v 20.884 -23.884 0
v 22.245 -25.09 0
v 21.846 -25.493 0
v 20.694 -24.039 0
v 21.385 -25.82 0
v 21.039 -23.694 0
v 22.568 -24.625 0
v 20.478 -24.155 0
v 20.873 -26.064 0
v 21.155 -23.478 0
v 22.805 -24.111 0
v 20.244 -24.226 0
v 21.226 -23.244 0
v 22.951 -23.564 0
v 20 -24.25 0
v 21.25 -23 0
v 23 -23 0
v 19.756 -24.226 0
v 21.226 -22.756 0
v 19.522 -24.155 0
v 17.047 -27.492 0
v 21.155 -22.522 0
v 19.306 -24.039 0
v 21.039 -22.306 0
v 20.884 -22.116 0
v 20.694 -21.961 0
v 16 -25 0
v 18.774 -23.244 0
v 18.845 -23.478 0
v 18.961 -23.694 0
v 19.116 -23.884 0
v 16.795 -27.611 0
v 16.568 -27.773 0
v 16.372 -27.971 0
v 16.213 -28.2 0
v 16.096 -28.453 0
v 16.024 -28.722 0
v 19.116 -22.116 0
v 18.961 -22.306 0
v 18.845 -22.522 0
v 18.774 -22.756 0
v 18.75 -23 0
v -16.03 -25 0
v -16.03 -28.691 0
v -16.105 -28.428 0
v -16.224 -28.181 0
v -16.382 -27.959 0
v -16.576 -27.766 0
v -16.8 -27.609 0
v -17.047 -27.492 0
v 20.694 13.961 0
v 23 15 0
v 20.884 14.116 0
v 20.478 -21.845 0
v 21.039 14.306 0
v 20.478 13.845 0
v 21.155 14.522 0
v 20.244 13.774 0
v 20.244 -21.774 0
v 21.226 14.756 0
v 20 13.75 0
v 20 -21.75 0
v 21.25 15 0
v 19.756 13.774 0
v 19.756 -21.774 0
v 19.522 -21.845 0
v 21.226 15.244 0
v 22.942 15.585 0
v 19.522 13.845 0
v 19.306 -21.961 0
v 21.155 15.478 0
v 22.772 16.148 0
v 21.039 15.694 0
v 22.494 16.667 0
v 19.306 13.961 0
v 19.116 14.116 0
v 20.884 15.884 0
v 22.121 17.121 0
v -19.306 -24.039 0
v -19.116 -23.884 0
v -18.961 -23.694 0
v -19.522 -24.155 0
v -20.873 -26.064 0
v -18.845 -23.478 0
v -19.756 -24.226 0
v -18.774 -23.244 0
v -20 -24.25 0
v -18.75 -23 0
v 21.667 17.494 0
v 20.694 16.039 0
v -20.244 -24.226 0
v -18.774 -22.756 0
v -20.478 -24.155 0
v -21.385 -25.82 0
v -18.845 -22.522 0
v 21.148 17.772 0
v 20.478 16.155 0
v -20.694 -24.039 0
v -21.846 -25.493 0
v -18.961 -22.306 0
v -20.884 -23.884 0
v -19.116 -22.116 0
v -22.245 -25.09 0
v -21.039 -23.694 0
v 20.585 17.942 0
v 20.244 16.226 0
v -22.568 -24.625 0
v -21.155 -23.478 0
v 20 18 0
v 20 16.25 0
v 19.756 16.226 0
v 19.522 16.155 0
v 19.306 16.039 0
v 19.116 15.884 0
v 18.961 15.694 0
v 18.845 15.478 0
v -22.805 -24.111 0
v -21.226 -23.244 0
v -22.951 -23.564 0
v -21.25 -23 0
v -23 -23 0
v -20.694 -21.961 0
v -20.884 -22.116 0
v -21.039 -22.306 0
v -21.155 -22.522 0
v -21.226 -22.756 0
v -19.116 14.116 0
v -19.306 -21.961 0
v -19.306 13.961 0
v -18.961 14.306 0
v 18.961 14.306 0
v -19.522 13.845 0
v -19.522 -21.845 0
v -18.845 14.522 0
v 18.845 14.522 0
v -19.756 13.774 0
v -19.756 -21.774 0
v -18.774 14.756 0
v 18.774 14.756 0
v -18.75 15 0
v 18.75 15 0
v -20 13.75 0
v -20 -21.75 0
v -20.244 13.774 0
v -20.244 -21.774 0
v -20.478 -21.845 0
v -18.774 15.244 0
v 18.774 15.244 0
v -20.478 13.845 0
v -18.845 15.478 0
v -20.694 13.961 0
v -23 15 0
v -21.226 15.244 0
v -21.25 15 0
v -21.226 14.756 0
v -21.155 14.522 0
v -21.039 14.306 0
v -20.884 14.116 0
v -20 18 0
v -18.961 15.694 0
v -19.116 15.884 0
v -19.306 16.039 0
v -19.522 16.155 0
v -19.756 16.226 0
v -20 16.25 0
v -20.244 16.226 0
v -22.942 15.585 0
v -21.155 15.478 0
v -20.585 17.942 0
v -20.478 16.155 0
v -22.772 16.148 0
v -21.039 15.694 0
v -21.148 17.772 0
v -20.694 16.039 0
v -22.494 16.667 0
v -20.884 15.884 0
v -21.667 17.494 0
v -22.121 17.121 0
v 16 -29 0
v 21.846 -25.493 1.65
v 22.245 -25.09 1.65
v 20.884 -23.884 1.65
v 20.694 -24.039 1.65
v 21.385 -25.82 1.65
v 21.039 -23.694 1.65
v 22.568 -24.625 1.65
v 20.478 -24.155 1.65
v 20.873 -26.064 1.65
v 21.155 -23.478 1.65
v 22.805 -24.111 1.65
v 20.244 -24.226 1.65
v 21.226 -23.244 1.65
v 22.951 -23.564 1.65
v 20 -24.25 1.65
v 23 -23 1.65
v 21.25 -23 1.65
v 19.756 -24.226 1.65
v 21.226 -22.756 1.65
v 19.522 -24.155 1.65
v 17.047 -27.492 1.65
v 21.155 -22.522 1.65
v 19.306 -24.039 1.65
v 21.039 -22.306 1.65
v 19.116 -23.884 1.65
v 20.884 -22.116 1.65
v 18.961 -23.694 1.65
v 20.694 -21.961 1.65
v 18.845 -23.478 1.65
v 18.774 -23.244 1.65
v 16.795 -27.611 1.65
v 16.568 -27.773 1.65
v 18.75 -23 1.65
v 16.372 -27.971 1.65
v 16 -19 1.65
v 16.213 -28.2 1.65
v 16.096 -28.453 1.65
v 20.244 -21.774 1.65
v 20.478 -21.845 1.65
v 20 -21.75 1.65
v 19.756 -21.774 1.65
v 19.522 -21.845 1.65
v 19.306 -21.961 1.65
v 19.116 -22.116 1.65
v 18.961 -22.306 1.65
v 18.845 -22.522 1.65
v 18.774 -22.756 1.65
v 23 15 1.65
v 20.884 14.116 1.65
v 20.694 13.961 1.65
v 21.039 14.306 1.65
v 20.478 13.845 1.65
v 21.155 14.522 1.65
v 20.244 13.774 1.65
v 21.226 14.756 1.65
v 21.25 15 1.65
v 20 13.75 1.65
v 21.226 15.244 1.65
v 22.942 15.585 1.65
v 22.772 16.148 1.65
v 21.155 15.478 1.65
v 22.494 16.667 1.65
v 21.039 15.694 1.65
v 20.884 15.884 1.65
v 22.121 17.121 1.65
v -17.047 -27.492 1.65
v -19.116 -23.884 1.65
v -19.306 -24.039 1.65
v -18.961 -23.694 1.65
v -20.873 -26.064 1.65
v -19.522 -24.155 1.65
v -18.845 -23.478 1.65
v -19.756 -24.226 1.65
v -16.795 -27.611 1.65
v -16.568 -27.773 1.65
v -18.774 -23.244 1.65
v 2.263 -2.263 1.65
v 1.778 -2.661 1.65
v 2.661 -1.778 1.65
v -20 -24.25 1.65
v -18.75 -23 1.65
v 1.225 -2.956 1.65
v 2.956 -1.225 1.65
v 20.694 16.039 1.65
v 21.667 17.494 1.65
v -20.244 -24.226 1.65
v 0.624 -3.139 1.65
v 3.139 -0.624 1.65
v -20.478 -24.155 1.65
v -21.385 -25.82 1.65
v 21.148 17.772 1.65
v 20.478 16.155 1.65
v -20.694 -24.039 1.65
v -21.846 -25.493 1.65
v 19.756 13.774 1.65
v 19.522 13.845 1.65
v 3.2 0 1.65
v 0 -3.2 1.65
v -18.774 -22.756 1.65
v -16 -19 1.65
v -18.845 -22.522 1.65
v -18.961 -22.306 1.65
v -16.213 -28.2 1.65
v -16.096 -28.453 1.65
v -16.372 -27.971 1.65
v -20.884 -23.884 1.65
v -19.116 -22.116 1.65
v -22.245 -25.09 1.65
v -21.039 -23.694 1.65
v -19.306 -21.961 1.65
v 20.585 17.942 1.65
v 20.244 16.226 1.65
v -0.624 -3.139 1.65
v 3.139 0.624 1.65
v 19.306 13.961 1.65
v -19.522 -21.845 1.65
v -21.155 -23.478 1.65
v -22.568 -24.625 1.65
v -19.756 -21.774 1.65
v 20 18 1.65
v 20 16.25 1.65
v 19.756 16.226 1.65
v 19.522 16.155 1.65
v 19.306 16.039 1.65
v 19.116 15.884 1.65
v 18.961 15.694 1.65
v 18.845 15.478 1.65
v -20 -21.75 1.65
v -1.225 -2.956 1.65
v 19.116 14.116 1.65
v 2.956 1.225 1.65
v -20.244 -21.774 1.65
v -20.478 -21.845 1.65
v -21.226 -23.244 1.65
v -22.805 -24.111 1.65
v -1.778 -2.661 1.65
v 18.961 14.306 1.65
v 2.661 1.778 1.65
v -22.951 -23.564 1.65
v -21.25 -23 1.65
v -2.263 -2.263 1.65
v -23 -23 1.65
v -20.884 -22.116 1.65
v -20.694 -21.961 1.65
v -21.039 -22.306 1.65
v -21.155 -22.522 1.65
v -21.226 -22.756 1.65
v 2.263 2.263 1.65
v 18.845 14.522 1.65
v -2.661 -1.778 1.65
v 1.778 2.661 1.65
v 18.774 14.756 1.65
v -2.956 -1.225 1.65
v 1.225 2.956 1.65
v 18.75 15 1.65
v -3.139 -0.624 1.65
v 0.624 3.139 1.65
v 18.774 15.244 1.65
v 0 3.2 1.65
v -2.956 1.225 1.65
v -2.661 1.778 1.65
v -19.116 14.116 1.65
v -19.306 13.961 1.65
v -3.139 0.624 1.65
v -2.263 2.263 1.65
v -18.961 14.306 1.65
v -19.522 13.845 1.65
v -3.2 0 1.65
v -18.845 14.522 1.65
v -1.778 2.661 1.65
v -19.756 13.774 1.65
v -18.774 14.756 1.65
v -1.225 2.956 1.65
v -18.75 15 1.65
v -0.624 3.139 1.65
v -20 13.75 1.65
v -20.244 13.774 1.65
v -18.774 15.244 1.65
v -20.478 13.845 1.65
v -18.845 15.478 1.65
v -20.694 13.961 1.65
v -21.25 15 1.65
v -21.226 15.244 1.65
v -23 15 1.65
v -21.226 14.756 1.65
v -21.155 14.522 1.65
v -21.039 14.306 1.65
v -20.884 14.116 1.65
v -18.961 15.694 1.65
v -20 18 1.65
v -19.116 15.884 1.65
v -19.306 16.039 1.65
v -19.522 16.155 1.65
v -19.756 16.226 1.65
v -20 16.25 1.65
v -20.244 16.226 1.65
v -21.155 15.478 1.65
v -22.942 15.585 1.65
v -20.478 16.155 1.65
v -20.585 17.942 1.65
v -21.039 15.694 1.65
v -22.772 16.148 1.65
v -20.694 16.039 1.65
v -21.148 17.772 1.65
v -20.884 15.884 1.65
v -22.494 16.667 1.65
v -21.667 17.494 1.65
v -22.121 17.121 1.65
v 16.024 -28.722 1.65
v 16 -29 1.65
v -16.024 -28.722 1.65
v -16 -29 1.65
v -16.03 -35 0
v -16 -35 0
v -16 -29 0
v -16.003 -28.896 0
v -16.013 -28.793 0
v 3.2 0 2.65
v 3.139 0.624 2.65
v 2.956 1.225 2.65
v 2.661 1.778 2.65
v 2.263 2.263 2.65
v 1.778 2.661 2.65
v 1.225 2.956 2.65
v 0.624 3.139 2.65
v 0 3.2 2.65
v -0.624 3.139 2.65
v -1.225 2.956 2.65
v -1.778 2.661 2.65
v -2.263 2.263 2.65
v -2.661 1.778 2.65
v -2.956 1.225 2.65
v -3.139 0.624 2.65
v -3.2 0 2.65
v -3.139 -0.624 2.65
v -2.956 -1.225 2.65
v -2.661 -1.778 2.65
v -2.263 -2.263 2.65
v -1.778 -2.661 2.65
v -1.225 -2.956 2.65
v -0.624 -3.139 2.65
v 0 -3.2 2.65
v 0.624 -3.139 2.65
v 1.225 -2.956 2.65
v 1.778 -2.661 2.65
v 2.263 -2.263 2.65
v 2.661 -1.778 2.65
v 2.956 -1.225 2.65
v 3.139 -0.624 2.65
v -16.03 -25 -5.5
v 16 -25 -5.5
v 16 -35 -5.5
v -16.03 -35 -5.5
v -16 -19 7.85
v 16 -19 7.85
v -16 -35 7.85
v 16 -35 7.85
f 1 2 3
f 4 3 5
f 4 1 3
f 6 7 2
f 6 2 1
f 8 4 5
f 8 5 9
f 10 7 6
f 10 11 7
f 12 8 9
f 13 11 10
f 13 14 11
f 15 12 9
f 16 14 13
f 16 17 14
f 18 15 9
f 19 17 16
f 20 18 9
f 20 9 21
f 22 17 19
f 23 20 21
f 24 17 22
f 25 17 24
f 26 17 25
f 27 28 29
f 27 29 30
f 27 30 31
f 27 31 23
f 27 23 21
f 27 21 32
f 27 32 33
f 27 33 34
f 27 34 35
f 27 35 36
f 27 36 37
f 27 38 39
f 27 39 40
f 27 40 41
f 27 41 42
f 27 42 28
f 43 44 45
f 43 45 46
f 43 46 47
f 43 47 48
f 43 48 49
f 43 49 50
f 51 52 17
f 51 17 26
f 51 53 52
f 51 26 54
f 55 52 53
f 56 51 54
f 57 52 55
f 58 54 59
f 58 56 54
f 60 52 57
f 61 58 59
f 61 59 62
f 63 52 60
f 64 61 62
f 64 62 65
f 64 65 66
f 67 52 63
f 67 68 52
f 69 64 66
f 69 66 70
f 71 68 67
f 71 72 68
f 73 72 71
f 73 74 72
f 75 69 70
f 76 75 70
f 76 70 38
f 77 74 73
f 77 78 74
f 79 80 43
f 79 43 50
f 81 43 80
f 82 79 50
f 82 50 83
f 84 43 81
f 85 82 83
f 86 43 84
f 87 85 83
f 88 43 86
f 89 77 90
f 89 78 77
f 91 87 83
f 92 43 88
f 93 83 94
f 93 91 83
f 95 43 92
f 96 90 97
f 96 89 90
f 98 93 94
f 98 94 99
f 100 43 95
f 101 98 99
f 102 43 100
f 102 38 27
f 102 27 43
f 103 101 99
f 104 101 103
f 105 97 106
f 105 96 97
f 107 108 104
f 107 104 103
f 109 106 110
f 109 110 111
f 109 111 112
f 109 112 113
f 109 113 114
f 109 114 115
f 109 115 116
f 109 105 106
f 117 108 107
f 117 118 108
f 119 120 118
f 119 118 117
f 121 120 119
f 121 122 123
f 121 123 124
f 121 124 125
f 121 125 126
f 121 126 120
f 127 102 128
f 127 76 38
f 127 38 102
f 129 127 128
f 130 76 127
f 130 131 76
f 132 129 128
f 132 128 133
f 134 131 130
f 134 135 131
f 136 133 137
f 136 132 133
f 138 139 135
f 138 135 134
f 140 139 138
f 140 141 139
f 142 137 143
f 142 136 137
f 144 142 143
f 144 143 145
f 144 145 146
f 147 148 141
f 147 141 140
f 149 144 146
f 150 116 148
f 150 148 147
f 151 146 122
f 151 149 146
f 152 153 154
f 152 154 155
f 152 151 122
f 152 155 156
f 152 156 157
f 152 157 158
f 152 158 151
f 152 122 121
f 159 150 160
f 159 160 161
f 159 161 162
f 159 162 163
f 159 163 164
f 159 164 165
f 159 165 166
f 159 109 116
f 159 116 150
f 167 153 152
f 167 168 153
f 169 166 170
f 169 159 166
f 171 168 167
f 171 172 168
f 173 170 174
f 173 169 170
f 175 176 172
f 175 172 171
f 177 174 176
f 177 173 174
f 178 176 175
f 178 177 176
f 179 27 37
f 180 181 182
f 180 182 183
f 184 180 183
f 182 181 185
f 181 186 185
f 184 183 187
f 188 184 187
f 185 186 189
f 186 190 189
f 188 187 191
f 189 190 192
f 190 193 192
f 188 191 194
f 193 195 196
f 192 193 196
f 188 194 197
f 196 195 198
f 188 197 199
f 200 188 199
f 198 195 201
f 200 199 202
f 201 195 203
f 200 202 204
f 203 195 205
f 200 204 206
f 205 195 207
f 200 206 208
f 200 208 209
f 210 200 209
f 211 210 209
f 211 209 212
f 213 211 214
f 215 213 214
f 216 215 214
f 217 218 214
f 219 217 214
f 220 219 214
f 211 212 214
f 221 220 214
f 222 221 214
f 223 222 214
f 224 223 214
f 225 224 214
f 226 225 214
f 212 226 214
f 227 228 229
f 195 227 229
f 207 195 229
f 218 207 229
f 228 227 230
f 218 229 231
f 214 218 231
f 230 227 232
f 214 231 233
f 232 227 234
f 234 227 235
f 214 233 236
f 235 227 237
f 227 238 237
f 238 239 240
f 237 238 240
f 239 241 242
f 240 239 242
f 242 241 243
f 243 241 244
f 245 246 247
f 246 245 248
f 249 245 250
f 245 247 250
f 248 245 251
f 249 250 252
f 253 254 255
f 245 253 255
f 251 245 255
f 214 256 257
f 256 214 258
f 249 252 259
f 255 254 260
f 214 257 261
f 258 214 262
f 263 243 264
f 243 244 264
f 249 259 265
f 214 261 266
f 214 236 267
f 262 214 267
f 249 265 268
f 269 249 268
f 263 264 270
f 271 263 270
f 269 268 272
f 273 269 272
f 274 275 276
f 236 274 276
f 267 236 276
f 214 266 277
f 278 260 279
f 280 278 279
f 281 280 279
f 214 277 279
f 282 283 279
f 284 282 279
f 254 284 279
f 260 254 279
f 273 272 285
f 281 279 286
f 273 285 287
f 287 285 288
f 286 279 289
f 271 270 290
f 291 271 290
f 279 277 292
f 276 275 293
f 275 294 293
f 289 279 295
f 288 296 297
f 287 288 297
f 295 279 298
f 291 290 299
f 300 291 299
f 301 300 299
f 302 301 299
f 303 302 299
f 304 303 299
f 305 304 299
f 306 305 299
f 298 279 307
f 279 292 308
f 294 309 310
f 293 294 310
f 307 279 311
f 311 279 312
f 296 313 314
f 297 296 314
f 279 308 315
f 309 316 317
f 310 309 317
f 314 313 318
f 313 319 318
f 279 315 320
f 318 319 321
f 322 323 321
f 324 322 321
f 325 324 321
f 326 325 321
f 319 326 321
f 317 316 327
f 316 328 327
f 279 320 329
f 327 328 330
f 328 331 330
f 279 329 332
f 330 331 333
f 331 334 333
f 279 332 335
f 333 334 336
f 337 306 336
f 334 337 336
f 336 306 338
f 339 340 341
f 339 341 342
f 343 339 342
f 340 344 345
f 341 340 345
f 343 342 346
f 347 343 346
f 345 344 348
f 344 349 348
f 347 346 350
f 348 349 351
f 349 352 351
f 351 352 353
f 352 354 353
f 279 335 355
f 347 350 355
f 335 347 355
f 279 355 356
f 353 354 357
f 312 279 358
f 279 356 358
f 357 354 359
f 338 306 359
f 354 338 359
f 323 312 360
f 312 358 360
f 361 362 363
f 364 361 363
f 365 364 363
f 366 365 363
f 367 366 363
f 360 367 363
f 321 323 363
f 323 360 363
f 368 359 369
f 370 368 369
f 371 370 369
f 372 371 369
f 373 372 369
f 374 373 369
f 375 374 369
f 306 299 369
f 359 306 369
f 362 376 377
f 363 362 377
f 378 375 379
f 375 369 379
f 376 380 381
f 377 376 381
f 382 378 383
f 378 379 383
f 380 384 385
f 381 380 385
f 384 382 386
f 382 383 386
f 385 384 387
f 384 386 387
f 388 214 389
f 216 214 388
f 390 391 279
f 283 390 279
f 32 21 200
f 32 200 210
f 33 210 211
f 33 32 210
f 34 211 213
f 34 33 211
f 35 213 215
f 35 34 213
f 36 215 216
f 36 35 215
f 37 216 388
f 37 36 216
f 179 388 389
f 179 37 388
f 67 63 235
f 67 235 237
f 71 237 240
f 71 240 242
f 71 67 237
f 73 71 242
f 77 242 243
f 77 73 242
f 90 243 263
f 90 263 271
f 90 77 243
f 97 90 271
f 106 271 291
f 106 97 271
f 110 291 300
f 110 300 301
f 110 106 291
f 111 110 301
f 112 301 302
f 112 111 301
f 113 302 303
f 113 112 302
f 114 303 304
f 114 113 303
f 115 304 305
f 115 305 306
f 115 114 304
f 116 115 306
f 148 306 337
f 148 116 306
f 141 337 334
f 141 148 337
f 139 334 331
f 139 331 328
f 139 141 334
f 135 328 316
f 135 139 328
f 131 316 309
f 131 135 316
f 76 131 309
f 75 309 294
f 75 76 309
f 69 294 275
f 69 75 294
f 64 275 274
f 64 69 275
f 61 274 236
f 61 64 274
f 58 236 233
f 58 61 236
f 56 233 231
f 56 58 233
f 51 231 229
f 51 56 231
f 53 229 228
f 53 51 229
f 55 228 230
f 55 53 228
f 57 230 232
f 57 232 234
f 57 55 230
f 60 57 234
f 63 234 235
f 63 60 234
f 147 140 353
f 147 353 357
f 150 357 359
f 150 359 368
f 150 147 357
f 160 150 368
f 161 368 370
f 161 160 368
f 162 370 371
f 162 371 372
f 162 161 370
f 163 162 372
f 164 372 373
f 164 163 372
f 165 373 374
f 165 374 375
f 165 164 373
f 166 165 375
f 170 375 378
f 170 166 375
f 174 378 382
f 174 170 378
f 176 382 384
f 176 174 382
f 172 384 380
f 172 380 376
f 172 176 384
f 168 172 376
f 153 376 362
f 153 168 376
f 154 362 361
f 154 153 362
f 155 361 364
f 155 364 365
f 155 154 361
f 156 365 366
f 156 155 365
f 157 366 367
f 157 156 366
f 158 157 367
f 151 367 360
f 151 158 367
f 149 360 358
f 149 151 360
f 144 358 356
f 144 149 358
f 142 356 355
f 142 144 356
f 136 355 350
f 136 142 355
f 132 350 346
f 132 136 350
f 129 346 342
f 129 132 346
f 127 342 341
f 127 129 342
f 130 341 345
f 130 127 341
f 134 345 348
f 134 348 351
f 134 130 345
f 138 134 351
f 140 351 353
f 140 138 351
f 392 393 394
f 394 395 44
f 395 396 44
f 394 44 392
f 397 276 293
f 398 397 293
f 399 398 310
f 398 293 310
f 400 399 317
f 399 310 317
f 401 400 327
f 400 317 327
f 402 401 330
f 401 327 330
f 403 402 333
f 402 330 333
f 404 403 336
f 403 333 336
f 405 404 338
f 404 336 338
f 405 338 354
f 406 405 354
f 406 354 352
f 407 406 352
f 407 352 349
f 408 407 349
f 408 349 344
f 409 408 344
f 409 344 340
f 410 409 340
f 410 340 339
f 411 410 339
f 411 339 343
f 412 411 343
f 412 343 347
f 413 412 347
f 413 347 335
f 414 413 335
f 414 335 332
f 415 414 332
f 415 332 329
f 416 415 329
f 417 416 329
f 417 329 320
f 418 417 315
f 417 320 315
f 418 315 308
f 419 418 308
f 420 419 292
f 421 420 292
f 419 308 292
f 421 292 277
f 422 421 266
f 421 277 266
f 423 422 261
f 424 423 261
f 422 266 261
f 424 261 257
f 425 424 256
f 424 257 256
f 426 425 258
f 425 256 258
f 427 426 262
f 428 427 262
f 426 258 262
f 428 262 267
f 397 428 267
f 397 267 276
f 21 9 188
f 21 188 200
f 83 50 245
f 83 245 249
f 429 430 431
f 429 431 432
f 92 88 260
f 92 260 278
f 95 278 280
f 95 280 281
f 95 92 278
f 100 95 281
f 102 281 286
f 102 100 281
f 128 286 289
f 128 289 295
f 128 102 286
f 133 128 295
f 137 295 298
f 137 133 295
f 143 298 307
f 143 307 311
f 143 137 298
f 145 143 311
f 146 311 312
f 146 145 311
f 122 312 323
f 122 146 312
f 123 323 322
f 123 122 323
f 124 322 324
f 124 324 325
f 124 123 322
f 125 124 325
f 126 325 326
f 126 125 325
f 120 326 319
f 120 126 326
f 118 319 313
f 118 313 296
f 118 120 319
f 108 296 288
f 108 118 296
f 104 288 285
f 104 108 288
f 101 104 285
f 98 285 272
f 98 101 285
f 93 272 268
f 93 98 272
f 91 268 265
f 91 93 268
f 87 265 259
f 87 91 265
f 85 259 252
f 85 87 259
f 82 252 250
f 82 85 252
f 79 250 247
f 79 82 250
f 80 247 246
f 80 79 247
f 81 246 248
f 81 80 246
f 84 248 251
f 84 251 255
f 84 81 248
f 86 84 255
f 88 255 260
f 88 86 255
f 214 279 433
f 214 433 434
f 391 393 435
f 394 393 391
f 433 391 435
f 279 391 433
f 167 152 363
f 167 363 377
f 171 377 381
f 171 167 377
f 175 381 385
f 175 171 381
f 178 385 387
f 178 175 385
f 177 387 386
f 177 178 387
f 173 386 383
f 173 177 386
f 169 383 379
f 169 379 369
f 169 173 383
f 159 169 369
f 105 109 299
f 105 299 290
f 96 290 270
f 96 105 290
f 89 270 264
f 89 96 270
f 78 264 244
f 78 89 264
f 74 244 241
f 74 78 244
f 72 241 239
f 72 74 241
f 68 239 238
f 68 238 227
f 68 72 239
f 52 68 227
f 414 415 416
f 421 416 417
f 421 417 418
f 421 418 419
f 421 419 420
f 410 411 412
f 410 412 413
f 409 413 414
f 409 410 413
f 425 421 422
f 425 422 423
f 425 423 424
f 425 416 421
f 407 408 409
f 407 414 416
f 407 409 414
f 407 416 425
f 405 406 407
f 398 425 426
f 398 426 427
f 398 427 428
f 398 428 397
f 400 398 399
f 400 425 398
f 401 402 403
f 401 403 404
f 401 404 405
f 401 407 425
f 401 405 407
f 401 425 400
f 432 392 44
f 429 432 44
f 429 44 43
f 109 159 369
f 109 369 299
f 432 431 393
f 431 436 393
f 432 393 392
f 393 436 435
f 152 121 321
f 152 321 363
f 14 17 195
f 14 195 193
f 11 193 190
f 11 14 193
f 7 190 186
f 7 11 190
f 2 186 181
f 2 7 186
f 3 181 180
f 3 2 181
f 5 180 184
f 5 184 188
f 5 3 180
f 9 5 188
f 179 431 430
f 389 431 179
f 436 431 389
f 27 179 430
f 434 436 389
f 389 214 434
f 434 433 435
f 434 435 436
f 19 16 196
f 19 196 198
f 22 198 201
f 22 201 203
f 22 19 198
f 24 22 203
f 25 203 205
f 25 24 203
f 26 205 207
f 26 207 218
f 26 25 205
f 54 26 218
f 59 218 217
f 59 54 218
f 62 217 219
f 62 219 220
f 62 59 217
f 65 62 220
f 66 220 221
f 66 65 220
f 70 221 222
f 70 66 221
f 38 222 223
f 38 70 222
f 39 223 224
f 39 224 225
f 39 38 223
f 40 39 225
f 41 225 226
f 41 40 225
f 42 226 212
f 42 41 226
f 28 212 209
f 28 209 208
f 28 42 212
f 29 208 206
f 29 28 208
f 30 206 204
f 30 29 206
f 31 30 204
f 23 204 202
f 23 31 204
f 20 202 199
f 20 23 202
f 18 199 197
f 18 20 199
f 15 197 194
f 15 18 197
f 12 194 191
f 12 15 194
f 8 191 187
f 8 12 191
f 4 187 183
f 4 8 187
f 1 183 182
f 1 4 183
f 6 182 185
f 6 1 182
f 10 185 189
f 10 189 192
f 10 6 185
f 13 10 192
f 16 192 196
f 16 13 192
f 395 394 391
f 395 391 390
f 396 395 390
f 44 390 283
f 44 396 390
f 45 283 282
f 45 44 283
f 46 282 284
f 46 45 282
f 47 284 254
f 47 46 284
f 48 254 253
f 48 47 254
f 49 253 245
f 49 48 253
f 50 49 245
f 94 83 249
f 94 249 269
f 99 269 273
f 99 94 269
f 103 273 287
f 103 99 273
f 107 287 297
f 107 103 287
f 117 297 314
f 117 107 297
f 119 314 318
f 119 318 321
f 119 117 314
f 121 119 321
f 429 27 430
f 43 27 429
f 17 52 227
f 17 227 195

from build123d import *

# Parameters (mm, degrees)
SKETCH1_R           = 3.2
SKETCH1_R_2         = 1.25
BOSS_EXTRUDE1_DEPTH = 1.65
SKETCH2_W           = 32
SKETCH2_H           = 16
BOSS_EXTRUDE2_DEPTH = 6.2
SKETCH1_2_R         = 3.2
BOSS_EXTRUDE3_DEPTH = 2.65
SKETCH3_W           = 32.03
SKETCH3_H           = 10
BOSS_EXTRUDE4_DEPTH = 5.5


with BuildPart() as part:
    # Sketch1 → Boss-Extrude1 (new body)
    with BuildSketch(Plane.XY):
        with BuildLine():
            Line((-20, 18), (20, 18))
            ThreePointArc((20, 18), (22.121320344, 17.121320344), (23, 15))
            Line((23, 15), (23, -23))
            ThreePointArc((23, -23), (22.416236427, -24.864680631), (20.873373788, -26.063592072))
            Line((20.873373788, -26.063592072), (17.047054496, -27.491625922))
            ThreePointArc((17.047054496, -27.491625922), (16.287418762, -28.081915652), (16, -29))
            Line((16, -29), (16, -35))
            Line((16, -35), (-16, -35))
            Line((-16, -35), (-16, -29))
            ThreePointArc((-16, -29), (-16.287418762, -28.081915652), (-17.047054496, -27.491625922))
            Line((-17.047054496, -27.491625922), (-20.873373788, -26.063592072))
            ThreePointArc((-20.873373788, -26.063592072), (-22.416236427, -24.864680631), (-23, -23))
            Line((-23, -23), (-23, 15))
            ThreePointArc((-23, 15), (-22.121320344, 17.121320344), (-20, 18))
        make_face()
        Circle(SKETCH1_R, mode=Mode.SUBTRACT)
        with Locations((20, 15)):
            Circle(SKETCH1_R_2, mode=Mode.SUBTRACT)
        with Locations((-20, 15)):
            Circle(SKETCH1_R_2, mode=Mode.SUBTRACT)
        with Locations((-20, -23)):
            Circle(SKETCH1_R_2, mode=Mode.SUBTRACT)
        with Locations((20, -23)):
            Circle(SKETCH1_R_2, mode=Mode.SUBTRACT)
    extrude(amount=BOSS_EXTRUDE1_DEPTH)

    # Sketch2 → Boss-Extrude2 (add)
    with BuildSketch(Plane.XY.offset(1.65)):
        with Locations((0, -27)):
            Rectangle(SKETCH2_W, SKETCH2_H)
    extrude(amount=BOSS_EXTRUDE2_DEPTH)

    # Sketch1<2> → Boss-Extrude3 (add)
    with BuildSketch(Plane.XY):
        Circle(SKETCH1_2_R)
    extrude(amount=BOSS_EXTRUDE3_DEPTH)

    # Sketch3 → Boss-Extrude4 (add)
    with BuildSketch(Plane(origin=(0, 0, 0), x_dir=(-1, 0, 0), z_dir=(0, 0, -1))):
        with Locations((0.015, -30)):
            Rectangle(SKETCH3_W, SKETCH3_H)
    extrude(amount=BOSS_EXTRUDE4_DEPTH)


solid = part.part
